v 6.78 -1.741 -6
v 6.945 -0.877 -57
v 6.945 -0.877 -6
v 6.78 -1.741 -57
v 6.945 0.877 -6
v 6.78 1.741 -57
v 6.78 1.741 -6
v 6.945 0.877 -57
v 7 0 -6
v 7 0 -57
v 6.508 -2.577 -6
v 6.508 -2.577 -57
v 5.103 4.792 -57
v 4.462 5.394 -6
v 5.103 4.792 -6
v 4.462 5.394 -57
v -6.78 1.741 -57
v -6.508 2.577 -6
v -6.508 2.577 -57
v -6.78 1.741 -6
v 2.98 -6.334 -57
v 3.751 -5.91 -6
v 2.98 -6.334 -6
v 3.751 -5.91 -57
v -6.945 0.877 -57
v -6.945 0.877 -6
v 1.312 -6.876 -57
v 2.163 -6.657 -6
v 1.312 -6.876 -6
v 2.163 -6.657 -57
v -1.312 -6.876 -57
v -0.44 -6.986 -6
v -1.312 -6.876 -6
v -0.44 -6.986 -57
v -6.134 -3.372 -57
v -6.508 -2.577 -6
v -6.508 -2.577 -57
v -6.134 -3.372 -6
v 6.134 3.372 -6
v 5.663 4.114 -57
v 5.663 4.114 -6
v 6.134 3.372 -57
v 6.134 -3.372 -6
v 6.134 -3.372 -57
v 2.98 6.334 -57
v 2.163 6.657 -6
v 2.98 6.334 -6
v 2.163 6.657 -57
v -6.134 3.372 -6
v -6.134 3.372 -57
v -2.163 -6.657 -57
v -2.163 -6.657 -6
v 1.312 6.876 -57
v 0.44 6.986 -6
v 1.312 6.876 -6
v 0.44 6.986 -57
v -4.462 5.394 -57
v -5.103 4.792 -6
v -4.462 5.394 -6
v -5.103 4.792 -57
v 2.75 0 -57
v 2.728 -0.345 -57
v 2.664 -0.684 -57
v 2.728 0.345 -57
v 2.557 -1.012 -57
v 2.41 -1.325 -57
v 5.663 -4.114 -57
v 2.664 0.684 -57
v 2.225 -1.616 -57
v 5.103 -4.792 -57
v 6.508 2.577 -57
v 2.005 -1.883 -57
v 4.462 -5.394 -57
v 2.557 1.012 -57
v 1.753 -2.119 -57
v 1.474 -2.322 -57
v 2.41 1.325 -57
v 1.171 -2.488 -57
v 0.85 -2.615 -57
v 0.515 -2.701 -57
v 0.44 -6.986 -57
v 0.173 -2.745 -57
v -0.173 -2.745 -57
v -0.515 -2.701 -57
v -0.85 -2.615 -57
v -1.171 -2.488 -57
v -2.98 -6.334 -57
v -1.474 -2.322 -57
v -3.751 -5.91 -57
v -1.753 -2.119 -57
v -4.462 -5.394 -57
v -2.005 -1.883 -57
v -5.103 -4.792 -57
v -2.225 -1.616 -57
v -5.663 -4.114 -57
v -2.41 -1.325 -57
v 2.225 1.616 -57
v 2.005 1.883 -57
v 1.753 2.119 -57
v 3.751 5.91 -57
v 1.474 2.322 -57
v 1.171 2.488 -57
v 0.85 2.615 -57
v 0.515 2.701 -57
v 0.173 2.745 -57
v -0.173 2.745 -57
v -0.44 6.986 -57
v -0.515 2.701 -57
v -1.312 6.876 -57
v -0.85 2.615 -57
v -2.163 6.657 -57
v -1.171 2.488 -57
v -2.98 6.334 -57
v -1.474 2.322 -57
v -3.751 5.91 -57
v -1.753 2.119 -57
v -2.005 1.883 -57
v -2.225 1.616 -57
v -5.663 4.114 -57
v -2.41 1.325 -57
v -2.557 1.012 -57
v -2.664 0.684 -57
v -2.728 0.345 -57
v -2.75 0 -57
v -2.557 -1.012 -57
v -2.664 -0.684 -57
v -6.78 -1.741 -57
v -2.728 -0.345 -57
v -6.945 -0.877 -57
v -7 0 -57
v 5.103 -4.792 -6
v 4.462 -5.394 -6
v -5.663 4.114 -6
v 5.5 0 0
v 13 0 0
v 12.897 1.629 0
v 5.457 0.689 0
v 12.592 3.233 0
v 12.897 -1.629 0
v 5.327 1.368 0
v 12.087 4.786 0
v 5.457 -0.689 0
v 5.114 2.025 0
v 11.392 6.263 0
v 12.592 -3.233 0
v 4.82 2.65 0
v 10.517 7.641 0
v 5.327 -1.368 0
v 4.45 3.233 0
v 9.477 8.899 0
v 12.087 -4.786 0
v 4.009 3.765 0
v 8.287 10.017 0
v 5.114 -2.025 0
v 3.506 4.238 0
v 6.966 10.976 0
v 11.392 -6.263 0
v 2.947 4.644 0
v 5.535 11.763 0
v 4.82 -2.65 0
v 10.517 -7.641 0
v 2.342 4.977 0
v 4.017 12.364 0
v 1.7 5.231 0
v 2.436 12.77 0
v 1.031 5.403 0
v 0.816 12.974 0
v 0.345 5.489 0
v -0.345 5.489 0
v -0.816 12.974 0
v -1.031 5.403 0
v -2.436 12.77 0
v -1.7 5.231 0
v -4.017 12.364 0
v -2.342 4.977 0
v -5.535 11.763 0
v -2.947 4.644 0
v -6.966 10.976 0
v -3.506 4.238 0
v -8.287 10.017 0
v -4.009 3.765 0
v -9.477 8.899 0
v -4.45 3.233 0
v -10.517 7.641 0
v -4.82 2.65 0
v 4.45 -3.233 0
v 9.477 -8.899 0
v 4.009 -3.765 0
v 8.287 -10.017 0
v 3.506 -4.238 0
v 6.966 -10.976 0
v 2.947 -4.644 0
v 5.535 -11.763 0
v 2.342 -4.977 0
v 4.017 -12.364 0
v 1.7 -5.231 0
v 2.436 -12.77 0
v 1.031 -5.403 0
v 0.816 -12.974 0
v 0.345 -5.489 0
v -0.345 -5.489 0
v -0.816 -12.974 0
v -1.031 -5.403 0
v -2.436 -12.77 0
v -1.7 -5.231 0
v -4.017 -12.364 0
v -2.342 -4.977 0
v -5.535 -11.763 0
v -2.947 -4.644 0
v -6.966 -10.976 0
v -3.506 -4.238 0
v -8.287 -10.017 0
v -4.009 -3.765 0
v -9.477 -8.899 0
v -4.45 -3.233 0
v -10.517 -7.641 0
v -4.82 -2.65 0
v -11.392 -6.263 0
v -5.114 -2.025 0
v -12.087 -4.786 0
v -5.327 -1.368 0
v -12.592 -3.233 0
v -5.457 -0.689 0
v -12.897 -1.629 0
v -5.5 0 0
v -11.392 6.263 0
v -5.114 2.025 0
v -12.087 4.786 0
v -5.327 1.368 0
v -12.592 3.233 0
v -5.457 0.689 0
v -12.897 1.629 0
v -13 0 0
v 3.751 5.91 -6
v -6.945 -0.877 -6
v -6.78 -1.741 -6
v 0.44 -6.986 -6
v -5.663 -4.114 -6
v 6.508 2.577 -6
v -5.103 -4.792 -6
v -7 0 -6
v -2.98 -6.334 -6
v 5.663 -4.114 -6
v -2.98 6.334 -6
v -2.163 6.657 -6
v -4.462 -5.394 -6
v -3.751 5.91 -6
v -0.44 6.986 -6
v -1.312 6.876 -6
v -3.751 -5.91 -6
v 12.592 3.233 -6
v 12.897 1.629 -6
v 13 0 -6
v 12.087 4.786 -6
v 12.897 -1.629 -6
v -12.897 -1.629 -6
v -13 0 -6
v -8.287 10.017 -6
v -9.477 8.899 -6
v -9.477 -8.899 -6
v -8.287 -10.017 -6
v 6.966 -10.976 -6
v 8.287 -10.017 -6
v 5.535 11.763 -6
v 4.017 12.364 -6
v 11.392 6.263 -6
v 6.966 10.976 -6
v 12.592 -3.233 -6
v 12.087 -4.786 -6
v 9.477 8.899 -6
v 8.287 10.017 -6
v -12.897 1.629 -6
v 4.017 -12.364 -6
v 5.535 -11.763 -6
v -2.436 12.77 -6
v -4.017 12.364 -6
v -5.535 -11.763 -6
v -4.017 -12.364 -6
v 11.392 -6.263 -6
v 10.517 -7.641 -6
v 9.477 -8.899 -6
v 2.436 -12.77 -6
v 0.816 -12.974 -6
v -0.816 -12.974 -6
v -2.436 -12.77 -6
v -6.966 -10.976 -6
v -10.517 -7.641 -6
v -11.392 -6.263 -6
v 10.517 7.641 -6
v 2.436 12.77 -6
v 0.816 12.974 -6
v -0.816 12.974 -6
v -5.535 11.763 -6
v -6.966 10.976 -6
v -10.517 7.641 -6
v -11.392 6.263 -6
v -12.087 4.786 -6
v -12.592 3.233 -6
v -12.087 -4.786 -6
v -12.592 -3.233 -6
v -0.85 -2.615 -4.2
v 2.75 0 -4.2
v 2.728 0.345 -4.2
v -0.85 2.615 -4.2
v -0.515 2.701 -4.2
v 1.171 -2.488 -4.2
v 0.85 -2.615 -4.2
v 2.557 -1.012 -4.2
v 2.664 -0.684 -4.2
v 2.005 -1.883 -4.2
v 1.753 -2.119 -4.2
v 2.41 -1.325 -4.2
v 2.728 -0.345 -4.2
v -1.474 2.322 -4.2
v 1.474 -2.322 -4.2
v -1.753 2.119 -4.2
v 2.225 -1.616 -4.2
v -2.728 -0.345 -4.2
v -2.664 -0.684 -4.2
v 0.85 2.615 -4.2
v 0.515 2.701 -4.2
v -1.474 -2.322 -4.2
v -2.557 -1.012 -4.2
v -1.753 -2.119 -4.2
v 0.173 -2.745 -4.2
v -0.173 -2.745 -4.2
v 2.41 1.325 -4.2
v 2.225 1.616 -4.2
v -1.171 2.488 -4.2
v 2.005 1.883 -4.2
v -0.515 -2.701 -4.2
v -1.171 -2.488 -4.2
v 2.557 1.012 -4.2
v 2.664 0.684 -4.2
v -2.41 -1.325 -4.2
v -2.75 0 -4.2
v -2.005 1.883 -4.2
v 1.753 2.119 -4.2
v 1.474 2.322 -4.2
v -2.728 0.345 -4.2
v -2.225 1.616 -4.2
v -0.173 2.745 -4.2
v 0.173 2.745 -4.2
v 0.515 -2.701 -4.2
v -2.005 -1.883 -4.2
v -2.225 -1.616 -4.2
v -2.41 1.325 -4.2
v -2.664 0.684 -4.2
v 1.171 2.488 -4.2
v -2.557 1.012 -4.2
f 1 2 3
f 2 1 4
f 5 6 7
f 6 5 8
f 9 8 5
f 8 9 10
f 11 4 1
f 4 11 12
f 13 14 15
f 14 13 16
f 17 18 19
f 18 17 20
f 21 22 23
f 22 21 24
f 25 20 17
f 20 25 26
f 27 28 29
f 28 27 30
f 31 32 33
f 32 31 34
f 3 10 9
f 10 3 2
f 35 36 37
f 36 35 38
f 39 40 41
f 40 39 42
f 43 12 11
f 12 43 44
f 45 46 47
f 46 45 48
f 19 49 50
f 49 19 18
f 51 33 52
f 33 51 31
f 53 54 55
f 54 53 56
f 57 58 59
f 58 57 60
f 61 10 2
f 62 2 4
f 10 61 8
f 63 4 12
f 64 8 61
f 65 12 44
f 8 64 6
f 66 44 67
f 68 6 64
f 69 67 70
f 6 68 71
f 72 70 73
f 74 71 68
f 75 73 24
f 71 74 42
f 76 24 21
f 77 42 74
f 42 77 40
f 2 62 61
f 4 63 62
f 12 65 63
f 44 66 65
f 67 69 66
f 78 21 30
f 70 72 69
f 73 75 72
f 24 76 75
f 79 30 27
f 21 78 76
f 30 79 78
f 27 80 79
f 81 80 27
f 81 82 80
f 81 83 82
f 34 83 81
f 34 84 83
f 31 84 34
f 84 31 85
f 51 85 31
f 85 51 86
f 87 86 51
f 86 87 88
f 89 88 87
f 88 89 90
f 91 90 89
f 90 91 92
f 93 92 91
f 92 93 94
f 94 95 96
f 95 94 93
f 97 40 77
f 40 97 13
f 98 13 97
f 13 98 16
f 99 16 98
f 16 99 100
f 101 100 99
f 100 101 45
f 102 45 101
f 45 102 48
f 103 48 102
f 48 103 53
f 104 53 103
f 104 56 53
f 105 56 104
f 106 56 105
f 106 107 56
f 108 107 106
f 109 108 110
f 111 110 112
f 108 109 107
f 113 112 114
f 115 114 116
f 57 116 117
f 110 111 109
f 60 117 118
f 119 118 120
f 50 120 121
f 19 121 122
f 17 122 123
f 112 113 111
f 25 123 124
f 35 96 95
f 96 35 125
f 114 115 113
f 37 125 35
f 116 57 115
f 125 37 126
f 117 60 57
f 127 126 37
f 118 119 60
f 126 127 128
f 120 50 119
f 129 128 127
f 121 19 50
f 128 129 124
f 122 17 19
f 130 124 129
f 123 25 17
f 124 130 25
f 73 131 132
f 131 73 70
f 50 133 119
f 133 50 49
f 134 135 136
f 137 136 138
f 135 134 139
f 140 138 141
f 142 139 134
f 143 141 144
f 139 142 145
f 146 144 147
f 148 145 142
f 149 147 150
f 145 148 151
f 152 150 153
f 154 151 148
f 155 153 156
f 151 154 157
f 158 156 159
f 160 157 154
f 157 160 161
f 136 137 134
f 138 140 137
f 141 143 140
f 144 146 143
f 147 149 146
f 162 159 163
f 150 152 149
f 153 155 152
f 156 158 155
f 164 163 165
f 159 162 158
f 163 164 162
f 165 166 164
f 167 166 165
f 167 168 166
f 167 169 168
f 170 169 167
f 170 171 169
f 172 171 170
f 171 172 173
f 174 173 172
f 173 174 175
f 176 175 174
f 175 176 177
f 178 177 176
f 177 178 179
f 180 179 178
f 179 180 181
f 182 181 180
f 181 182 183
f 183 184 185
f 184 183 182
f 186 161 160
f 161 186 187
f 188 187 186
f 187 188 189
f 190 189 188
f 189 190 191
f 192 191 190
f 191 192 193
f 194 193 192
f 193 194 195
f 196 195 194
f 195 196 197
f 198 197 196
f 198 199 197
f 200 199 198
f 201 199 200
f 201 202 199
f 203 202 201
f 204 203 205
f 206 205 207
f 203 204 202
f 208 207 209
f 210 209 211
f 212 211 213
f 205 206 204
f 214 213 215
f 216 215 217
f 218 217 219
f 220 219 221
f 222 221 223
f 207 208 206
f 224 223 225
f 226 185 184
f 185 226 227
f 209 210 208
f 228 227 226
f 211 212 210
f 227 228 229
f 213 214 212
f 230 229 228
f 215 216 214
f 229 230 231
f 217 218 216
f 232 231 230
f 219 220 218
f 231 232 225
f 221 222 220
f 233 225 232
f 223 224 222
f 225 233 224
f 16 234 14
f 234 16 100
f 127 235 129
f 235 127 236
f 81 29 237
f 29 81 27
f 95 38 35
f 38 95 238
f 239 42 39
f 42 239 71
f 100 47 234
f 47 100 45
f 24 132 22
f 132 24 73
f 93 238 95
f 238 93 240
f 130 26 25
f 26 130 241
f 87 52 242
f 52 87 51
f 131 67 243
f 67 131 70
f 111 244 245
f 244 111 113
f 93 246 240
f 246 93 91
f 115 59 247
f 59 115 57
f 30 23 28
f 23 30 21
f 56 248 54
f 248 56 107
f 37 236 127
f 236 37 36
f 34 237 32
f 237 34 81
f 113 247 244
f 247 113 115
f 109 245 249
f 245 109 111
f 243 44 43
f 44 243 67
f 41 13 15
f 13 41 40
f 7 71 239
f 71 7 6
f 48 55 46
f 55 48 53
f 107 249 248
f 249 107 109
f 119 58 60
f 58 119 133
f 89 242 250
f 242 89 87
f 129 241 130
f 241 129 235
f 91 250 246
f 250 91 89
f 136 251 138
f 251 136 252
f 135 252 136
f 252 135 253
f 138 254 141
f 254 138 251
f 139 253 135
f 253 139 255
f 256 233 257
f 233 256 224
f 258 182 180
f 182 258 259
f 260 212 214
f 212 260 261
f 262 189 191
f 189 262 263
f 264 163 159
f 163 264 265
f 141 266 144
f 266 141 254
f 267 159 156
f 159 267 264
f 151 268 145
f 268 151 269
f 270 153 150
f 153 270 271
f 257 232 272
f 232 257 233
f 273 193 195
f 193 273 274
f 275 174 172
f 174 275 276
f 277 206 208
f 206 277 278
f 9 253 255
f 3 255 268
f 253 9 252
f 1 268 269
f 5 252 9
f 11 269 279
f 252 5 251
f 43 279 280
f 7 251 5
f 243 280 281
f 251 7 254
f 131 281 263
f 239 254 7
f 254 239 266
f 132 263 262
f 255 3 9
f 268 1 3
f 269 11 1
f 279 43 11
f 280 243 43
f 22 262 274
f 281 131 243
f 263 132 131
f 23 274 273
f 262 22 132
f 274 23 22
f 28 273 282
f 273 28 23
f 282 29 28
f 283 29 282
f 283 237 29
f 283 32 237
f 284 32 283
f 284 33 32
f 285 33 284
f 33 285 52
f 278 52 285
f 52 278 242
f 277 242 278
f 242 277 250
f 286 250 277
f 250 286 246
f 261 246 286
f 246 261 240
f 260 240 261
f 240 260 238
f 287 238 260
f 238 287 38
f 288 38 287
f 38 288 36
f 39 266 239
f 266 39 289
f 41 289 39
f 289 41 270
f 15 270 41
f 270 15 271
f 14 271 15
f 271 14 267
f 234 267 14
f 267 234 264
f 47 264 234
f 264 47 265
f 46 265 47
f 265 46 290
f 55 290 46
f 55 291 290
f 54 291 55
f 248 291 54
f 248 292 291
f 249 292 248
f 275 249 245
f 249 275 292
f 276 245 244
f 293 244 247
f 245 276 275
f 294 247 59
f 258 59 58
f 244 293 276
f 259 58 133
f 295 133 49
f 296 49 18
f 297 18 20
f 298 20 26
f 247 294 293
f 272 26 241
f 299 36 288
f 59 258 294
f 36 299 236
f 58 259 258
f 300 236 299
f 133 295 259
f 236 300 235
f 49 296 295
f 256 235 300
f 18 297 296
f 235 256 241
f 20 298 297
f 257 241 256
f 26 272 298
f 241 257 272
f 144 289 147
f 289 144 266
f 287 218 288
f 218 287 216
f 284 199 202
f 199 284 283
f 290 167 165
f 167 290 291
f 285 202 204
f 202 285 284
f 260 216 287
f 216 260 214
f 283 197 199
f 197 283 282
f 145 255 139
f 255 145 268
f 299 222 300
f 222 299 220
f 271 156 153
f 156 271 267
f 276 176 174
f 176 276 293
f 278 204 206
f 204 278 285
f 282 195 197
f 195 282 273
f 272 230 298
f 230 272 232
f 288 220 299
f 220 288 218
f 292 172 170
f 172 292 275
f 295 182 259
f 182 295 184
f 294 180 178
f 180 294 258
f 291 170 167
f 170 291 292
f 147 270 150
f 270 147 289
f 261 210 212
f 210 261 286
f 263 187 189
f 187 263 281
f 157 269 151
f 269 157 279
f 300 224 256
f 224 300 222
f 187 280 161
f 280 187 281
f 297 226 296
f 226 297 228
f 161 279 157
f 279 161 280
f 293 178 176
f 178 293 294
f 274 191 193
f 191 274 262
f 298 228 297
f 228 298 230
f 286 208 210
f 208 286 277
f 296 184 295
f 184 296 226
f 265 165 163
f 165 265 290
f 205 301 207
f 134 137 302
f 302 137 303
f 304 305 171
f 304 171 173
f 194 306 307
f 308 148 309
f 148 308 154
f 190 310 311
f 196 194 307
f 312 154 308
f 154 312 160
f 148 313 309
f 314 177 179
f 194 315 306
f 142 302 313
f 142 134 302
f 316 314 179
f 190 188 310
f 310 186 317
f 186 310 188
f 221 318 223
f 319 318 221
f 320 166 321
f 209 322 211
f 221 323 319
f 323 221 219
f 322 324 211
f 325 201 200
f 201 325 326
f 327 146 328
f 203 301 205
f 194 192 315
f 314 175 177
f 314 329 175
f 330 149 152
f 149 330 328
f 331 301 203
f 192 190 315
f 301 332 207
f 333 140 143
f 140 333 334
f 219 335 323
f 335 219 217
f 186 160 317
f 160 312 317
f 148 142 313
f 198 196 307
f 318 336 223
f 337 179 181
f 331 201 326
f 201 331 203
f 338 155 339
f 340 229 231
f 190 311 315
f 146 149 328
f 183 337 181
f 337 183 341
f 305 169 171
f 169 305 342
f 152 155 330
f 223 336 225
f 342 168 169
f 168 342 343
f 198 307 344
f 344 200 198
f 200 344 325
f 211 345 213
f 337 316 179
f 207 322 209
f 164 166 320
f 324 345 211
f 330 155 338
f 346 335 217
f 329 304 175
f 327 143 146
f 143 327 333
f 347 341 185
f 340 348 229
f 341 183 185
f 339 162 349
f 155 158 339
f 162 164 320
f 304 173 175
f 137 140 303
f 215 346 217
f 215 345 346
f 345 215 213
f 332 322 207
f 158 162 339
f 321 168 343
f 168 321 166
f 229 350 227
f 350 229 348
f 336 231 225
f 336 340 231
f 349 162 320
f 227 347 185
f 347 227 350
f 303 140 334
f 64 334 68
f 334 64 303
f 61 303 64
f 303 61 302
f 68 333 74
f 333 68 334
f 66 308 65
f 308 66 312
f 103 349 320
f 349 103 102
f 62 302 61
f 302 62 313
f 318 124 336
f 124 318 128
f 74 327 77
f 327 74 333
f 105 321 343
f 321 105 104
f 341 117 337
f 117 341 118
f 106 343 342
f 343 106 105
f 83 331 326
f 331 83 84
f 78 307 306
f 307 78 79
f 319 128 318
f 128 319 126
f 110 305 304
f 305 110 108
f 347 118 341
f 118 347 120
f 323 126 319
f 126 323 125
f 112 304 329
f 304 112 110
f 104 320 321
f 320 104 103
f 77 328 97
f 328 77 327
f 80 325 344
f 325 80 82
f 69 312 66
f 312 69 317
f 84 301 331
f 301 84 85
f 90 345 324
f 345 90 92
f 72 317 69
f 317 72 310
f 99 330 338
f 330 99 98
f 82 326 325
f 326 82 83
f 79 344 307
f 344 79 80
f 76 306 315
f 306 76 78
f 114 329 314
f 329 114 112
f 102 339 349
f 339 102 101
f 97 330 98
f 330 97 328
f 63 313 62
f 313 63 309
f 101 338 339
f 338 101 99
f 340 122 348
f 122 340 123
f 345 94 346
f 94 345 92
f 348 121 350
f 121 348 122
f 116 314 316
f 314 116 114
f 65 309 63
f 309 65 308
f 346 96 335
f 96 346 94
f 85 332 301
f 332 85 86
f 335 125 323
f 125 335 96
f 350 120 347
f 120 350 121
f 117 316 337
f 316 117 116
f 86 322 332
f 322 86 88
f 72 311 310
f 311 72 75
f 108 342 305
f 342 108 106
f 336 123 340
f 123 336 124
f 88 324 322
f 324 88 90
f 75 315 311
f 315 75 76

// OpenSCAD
$fn = 50;


difference() {
	union() {
		translate(v = [0, 0, -57.0000000000]) {
			cylinder(h = 57, r = 7.0000000000);
		}
		translate(v = [0, 0, -6.0000000000]) {
			cylinder(h = 6, r = 13.0000000000);
		}
	}
	union() {
		translate(v = [0, 0, 0]) {
			rotate(a = [0, 0, 0]) {
				difference() {
					union() {
						#translate(v = [0, 0, -57.0000000000]) {
							cylinder(h = 57, r = 2.2500000000);
						}
						#translate(v = [0, 0, -4.2000000000]) {
							cylinder(h = 4.2000000000, r1 = 2.7500000000, r2 = 5.5000000000);
						}
						#translate(v = [0, 0, -57.0000000000]) {
							cylinder(h = 57, r = 2.7500000000);
						}
						#translate(v = [0, 0, -57.0000000000]) {
							cylinder(h = 57, r = 2.2500000000);
						}
					}
					union();
				}
			}
		}
	}
}
